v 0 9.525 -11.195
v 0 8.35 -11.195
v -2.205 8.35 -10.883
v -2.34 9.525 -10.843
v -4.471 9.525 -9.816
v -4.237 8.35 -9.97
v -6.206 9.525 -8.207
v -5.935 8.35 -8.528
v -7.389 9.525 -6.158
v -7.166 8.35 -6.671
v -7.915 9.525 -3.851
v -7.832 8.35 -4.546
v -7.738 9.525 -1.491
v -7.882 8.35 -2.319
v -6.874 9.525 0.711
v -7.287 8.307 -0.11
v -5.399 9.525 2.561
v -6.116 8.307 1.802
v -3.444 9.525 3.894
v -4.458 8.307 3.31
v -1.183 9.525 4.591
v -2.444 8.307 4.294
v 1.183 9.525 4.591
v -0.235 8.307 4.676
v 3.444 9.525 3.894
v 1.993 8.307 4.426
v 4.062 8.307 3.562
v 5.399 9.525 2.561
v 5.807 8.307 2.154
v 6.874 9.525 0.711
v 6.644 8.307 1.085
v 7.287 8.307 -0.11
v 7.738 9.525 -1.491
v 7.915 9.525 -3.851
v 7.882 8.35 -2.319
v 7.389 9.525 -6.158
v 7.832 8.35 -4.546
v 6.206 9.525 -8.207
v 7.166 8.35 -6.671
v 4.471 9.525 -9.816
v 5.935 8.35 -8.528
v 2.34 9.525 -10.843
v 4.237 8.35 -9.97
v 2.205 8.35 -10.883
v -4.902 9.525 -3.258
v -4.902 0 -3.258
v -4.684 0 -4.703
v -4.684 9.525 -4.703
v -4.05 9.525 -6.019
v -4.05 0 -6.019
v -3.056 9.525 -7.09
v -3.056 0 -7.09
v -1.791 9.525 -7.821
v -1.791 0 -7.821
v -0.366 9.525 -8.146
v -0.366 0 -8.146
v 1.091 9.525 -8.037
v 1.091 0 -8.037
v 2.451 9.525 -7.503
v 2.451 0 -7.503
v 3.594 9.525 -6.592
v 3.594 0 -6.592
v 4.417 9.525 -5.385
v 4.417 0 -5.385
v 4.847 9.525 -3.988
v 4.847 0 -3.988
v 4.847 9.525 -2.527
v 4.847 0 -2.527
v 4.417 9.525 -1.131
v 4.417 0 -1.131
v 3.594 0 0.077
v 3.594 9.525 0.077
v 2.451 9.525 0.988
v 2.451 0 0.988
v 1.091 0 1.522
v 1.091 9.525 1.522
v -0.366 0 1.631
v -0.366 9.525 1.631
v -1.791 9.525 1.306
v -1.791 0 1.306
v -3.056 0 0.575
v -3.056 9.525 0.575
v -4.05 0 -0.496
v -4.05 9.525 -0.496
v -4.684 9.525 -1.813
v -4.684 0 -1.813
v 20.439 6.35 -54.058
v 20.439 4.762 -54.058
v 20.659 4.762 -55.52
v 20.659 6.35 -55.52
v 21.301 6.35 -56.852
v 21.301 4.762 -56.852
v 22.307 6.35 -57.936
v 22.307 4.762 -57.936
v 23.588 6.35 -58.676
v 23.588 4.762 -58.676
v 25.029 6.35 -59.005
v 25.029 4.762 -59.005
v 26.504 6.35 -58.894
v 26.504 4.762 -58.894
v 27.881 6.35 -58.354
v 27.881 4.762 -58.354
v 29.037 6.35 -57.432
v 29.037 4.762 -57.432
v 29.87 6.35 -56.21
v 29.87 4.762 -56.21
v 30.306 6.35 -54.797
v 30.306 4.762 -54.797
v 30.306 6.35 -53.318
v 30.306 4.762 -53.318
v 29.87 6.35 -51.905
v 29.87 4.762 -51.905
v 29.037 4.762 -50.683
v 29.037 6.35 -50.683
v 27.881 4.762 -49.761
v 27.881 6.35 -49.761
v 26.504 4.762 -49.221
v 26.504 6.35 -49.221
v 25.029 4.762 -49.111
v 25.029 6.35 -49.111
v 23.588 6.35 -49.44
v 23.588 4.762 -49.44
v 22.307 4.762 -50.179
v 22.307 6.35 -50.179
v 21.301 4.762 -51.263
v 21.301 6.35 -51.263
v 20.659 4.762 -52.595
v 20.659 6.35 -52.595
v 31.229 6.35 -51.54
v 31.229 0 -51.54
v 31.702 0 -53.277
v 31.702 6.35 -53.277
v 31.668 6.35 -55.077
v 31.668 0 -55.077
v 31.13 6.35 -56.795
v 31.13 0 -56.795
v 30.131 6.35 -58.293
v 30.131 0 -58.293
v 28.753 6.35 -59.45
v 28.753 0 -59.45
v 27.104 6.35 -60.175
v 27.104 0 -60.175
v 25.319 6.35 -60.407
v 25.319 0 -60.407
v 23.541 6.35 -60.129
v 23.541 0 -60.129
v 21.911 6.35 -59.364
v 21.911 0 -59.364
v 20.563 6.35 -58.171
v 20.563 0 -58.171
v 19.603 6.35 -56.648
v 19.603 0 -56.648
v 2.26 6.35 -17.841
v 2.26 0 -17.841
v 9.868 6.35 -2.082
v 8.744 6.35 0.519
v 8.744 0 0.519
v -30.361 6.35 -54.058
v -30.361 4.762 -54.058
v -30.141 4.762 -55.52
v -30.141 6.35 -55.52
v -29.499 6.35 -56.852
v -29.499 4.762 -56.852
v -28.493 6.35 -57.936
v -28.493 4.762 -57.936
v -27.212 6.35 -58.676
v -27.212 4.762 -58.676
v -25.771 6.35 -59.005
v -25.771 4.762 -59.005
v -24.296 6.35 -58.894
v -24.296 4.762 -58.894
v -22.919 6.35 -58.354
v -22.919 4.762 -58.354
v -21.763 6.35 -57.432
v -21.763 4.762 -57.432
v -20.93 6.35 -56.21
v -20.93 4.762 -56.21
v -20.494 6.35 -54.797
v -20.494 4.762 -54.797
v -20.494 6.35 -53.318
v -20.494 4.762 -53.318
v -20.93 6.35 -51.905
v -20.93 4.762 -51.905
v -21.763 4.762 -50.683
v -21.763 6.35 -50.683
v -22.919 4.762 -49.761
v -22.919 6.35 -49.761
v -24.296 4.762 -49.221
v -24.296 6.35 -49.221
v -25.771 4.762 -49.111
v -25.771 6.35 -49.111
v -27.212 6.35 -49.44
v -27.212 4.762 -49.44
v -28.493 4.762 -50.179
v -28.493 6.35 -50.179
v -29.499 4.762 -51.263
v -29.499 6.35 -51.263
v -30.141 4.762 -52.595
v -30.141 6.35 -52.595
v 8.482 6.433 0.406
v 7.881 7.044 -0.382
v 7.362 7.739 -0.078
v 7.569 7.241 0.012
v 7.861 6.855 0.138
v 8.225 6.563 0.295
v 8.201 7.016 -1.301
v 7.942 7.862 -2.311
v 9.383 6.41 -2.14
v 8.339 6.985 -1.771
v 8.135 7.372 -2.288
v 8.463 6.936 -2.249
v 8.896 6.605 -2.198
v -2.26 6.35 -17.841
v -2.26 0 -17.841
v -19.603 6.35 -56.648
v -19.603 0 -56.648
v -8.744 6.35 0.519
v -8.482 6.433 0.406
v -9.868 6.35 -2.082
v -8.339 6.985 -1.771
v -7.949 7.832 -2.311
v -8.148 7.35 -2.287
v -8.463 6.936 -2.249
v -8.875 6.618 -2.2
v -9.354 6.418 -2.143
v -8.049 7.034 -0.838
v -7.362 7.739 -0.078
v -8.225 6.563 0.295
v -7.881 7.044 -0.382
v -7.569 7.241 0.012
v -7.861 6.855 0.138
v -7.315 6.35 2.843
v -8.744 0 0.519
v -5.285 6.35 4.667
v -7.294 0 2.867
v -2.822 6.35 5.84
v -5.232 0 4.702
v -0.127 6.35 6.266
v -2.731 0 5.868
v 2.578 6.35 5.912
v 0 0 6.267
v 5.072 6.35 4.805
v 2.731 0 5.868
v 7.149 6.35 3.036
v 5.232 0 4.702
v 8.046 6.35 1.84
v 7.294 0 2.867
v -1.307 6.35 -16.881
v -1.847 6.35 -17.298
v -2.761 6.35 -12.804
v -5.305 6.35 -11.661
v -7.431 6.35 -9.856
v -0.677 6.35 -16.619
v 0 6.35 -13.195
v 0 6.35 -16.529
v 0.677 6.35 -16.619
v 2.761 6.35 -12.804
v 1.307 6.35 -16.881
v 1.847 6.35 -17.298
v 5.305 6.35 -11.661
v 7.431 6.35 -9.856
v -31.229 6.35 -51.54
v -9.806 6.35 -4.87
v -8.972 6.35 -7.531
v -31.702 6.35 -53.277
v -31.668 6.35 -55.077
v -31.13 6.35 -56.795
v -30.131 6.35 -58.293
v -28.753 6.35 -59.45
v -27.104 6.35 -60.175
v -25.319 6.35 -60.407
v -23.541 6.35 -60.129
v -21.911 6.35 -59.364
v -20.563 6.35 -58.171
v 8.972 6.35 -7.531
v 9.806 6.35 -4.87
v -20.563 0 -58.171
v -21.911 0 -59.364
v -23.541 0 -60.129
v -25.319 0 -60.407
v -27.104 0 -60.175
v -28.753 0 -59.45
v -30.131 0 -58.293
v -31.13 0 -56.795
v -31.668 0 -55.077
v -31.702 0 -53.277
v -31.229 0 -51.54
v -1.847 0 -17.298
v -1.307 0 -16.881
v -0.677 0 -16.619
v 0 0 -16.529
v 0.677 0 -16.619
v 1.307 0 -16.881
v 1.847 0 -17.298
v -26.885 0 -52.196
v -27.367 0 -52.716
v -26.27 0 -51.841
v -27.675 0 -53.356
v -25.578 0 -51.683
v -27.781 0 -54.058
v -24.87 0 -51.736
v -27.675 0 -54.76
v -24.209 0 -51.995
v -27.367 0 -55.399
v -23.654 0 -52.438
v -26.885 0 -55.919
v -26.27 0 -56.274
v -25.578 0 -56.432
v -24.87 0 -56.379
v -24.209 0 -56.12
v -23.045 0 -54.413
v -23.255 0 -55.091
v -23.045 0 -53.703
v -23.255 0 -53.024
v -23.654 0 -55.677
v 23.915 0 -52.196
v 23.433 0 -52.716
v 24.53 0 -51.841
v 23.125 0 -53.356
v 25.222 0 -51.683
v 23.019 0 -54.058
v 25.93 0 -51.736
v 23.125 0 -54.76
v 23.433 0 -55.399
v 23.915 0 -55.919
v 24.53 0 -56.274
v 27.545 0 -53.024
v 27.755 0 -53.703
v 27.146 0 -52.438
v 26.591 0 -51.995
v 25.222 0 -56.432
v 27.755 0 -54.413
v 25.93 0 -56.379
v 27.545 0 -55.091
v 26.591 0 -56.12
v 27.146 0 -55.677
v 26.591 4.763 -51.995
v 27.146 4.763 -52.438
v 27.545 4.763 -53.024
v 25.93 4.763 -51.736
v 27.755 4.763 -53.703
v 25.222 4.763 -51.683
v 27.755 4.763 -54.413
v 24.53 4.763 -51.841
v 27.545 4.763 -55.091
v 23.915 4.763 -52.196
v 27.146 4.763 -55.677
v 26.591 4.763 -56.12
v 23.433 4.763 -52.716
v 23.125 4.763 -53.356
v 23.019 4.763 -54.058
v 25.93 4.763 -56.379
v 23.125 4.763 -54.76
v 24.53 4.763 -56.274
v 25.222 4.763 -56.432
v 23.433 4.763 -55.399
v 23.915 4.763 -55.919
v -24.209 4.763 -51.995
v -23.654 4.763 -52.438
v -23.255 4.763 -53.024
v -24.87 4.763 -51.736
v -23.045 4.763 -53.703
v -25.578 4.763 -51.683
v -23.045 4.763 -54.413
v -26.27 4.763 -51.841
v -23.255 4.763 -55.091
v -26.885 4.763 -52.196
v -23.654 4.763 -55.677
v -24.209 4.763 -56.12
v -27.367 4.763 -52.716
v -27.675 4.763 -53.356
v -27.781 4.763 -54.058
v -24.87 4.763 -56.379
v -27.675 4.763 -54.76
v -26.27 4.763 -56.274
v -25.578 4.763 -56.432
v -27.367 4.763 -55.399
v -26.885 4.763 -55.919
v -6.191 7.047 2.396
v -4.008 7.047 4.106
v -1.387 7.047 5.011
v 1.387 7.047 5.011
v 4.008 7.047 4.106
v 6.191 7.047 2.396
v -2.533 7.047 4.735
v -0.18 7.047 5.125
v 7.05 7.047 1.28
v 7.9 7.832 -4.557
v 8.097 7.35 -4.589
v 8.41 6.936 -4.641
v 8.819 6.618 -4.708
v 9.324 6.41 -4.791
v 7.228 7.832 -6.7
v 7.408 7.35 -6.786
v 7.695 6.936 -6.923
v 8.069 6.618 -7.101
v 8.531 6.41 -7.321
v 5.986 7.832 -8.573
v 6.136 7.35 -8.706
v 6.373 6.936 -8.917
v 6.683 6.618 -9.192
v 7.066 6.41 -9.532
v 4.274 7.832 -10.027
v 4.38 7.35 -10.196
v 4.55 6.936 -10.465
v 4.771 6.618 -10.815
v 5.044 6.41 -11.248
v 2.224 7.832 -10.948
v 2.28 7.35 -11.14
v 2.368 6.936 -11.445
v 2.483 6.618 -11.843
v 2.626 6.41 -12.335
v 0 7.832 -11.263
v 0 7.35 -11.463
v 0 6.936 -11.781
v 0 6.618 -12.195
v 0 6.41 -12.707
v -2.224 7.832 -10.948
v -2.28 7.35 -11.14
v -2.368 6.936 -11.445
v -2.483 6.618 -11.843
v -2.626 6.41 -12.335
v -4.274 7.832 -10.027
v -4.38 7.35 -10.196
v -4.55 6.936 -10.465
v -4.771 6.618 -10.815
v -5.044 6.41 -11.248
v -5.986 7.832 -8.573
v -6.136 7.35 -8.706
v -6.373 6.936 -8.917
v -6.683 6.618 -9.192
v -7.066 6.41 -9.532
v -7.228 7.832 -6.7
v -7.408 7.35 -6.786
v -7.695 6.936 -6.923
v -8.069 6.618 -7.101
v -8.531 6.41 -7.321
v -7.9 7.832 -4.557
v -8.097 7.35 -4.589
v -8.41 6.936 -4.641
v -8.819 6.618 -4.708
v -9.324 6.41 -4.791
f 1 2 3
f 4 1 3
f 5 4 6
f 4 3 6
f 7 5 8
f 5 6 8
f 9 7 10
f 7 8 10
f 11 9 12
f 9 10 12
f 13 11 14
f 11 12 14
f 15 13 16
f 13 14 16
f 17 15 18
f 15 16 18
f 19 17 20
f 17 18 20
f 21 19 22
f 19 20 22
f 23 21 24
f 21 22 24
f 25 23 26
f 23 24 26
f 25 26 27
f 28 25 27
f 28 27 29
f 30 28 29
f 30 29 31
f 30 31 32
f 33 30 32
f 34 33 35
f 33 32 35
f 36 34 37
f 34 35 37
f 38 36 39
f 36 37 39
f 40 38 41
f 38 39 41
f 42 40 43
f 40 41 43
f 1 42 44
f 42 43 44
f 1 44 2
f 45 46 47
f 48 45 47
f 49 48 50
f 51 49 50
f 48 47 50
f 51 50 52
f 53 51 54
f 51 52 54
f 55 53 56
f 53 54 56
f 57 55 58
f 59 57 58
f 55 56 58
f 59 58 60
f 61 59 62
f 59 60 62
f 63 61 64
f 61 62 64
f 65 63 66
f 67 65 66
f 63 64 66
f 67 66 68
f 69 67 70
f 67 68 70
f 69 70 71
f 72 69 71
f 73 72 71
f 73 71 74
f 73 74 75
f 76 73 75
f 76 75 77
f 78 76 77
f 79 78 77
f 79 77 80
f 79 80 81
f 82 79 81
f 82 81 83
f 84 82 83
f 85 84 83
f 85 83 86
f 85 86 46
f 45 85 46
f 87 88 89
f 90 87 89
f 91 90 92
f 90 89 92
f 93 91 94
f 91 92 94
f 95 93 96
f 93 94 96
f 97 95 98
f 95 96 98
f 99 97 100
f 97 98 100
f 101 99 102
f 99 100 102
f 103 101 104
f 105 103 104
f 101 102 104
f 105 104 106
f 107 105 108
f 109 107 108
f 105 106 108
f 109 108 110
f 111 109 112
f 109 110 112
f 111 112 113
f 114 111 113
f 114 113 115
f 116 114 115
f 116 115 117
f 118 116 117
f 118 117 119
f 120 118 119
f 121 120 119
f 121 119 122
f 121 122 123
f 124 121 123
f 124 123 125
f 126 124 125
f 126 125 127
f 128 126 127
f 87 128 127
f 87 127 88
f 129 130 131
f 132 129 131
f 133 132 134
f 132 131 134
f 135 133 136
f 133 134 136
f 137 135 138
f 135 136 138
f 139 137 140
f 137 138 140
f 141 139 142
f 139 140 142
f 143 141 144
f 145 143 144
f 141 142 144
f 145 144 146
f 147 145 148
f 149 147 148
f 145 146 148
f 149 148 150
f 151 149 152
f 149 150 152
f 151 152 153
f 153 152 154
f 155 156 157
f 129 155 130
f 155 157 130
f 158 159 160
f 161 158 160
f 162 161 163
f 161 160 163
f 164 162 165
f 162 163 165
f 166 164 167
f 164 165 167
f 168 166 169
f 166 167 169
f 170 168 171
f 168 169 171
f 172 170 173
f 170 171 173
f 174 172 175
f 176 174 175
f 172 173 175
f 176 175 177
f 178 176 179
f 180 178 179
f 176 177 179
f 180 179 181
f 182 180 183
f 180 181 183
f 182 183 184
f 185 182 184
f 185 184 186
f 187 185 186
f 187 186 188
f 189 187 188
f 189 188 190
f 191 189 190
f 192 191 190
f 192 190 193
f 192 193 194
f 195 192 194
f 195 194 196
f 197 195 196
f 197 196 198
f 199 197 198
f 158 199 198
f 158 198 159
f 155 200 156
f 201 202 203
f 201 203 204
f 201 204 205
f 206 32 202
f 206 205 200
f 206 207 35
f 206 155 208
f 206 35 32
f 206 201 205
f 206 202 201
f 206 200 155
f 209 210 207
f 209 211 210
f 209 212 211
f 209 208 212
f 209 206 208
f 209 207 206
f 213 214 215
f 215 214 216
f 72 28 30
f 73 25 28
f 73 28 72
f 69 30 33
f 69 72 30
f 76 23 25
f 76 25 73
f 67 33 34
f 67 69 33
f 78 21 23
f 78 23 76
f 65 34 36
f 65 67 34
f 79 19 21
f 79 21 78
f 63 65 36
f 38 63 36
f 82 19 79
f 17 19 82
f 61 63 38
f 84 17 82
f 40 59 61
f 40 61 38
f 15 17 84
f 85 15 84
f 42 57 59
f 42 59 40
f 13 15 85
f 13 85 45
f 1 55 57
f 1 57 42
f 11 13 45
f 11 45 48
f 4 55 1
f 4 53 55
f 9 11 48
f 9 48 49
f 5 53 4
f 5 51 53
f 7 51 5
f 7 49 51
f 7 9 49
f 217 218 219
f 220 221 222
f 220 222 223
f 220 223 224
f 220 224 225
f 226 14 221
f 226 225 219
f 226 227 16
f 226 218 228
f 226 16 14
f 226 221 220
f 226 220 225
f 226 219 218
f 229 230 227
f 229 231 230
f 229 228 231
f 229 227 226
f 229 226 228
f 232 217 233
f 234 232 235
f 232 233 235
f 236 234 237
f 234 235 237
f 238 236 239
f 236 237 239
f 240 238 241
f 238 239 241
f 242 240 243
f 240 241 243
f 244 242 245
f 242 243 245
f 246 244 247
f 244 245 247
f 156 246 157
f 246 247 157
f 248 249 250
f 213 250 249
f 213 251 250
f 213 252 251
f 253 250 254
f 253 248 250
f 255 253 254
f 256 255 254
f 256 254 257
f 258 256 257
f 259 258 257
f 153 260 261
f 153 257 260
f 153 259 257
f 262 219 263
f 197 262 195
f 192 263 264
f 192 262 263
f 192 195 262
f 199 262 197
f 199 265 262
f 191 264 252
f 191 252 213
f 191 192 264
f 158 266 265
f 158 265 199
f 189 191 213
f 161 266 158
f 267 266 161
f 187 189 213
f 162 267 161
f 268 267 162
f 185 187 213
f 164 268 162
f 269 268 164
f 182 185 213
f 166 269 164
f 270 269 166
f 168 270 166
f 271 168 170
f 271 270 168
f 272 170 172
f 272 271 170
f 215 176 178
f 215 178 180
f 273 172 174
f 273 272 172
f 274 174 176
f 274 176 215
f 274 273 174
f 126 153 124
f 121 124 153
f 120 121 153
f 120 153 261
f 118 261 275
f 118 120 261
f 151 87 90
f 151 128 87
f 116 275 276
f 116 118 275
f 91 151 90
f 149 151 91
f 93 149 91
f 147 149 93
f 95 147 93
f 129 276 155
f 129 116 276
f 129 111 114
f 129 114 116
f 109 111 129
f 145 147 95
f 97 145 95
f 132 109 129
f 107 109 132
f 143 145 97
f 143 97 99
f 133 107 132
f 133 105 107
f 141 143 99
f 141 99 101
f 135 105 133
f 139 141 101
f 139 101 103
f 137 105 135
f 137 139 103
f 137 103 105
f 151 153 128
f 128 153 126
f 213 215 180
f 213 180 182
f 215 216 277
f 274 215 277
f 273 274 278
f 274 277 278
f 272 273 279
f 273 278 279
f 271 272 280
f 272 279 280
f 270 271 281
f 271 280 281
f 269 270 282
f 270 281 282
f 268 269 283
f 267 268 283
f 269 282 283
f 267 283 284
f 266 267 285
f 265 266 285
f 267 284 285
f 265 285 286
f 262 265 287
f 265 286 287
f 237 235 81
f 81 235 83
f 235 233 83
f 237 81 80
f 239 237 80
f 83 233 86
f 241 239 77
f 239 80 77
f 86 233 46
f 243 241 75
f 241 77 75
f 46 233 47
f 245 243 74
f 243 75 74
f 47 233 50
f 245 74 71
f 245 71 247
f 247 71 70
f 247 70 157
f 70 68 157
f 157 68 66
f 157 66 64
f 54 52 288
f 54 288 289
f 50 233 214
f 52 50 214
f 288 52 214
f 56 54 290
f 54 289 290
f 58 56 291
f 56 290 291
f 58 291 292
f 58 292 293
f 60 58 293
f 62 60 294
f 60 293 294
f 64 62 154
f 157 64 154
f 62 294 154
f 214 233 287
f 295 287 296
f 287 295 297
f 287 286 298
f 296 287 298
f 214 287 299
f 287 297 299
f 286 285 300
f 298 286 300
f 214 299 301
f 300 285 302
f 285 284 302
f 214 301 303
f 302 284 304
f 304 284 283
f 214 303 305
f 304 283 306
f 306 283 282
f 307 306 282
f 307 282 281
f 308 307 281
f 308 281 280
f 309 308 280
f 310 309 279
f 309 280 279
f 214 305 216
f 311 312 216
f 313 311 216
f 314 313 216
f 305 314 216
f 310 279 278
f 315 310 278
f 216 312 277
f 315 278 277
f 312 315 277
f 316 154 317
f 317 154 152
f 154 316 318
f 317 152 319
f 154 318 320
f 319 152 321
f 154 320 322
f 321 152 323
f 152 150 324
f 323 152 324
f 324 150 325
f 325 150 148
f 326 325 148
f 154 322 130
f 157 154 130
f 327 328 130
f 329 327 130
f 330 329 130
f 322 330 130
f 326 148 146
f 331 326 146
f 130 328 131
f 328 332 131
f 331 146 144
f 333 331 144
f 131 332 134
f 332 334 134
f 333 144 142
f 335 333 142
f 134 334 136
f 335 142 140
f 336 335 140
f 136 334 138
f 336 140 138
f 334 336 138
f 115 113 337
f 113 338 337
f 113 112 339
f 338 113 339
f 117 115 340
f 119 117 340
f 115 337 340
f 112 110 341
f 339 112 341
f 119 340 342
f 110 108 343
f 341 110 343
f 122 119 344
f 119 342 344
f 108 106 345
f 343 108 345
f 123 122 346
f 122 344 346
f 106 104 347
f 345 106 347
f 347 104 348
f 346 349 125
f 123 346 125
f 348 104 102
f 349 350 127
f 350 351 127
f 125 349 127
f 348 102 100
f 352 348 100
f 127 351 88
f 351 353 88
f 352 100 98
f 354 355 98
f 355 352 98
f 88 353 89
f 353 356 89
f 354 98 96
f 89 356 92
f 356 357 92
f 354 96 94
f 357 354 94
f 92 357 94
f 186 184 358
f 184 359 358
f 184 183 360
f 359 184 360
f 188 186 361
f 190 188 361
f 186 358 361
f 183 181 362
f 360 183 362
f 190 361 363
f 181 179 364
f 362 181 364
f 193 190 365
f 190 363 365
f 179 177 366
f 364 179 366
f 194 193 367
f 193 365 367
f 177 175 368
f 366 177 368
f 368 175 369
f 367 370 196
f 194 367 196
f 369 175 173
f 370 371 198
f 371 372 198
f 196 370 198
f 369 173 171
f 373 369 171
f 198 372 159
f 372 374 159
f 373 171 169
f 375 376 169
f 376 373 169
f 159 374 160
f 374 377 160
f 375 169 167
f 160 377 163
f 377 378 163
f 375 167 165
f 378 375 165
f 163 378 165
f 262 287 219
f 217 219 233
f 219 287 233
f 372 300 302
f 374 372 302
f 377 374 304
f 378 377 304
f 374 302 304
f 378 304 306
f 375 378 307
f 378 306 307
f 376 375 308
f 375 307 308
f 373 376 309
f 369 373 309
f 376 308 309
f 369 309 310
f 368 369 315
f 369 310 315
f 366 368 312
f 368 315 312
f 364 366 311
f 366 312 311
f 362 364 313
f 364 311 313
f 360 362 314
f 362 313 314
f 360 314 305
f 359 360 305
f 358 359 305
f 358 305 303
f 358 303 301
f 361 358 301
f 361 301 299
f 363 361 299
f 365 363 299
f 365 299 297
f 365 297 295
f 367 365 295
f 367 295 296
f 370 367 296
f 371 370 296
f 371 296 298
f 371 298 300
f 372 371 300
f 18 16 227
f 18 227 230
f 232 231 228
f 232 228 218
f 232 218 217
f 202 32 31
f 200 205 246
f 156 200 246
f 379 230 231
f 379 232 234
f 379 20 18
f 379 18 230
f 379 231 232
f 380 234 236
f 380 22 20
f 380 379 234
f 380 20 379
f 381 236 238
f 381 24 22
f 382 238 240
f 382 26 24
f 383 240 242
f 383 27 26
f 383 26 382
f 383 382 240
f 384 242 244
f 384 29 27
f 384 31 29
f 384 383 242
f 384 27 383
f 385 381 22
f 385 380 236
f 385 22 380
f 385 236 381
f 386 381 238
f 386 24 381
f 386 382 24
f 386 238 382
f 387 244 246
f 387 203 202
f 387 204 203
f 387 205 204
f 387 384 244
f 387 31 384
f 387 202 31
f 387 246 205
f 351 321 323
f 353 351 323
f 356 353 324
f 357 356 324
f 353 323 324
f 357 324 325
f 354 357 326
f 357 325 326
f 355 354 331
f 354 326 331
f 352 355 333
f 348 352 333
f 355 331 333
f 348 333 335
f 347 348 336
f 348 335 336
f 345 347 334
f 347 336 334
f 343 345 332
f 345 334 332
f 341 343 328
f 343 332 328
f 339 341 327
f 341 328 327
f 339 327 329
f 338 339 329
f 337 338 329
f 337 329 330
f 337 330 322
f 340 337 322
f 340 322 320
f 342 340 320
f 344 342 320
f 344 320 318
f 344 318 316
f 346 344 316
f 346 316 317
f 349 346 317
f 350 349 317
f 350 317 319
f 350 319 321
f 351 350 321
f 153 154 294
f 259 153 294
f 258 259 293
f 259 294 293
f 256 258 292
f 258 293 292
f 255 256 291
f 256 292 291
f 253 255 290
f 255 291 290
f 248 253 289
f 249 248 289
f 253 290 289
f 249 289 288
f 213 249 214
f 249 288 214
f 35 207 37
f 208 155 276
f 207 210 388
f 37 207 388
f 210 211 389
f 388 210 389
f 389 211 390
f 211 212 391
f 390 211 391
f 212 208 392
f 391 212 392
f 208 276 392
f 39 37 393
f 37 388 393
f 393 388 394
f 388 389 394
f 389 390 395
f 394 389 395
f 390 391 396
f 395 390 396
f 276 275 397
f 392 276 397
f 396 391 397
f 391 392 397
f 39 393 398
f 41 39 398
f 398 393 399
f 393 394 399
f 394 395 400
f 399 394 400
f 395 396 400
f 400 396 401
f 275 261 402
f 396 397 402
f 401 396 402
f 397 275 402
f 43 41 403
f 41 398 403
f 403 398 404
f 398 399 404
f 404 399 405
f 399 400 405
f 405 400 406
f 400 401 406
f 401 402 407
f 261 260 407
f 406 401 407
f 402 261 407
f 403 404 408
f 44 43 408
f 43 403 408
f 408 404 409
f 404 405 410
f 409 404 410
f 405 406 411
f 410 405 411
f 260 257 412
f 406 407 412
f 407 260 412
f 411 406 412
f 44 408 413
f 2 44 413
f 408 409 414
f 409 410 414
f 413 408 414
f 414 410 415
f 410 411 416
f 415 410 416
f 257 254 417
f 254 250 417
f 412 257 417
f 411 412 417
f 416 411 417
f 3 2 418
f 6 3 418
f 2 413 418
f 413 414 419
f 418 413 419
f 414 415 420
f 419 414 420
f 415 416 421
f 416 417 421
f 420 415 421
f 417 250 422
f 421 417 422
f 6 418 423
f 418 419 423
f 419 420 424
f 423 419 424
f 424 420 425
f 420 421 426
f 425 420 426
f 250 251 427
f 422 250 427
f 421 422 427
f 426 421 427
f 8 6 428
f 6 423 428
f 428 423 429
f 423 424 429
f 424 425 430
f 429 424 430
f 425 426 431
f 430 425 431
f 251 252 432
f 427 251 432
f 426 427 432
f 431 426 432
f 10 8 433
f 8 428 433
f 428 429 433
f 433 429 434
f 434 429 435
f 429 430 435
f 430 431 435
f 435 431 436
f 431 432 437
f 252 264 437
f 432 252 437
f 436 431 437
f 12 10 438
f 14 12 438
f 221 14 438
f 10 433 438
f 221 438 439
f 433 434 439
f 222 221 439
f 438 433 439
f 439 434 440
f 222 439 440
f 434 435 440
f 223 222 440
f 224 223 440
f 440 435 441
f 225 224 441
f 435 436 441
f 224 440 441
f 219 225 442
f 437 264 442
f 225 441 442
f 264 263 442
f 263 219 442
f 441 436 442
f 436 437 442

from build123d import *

# Parameters (mm, degrees)
SKETCH1_R                            = 7.9375
BOSS_EXTRUDE1_DEPTH                  = 6.35
F_3_16_0_1875_DIAMETER_HOLE1_D       = 4.7625
SKETCH1_3_R                          = 7.9375
BOSS_EXTRUDE2_DEPTH                  = 9.525
W_0_386_DIAMETER_HOLE1_D             = 9.8044
FILLET1_R                            = 2
F_25_64_0_39063_DIAMETER_HOLE1_D     = 9.922002
F_25_64_0_39063_DIAMETER_HOLE1_DEPTH = 1.5875


with BuildPart() as part:
    # Sketch1 → Boss-Extrude1 (new body)
    with BuildSketch(Plane(origin=(0, 0, 0), x_dir=(1, 0, 0), z_dir=(0, 1, 0))):
        with BuildLine():
            ThreePointArc((2.26024053, 17.840513709), (0, 16.529128421), (-2.26024053, 17.840513709))
            Line((-2.26024053, 17.840513709), (-19.602540008, 56.648386542))
            ThreePointArc((-19.602540008, 56.648386542), (-27.954355314, 59.871226792), (-31.229481324, 51.539776269))
            Line((-31.229481324, 51.539776269), (-8.744221986, -0.519156562))
            ThreePointArc((-8.744221986, -0.519156562), (0, -6.267358068), (8.744221986, -0.519156562))
            Line((8.744221986, -0.519156562), (31.229481324, 51.539776269))
            ThreePointArc((31.229481324, 51.539776269), (27.954355314, 59.871226792), (19.602540008, 56.648386542))
            Line((19.602540008, 56.648386542), (2.26024053, 17.840513709))
        make_face()
        with Locations(Location((0, 3.257641932, 0), (0, 0, 270))):
            Circle(SKETCH1_R, mode=Mode.SUBTRACT)
    extrude(amount=BOSS_EXTRUDE1_DEPTH)

    # 3/16 (0.1875) Diameter Hole1 (through all)
    with Locations(Plane(origin=(0, 6.35, 0), x_dir=(1, 0, 0), z_dir=(0, 1, 0))):
        with Locations((-25.4, 54.057641932), (25.4, 54.057641932)):
            Hole(F_3_16_0_1875_DIAMETER_HOLE1_D / 2)

    # Sketch1<3> → Boss-Extrude2 (add)
    with BuildSketch(Plane(origin=(0, 0, 0), x_dir=(1, 0, 0), z_dir=(0, 1, 0))):
        with Locations(Location((0, 3.257641932, 0), (0, 0, 90))):
            Circle(SKETCH1_3_R)
    extrude(amount=BOSS_EXTRUDE2_DEPTH)

    # W (0.386) Diameter Hole1 (through all)
    with Locations(Plane(origin=(0, 9.525, 0), x_dir=(1, 0, 0), z_dir=(0, 1, 0))):
        with Locations((0, 3.257641932)):
            Hole(W_0_386_DIAMETER_HOLE1_D / 2)

    # Fillet1
    fillet1_edges = [part.edges().sort_by_distance(p)[0] for p in [
        (0, 6.35, 4.679858068),
    ]]
    fillet(fillet1_edges, radius=FILLET1_R)

    # 25/64 (0.39063) Diameter Hole1
    with Locations(Plane(origin=(0, 6.35, 0), x_dir=(1, 0, 0), z_dir=(0, 1, 0))):
        with Locations((-25.4, 54.057641932), (25.4, 54.057641932)):
            Hole(F_25_64_0_39063_DIAMETER_HOLE1_D / 2, depth=F_25_64_0_39063_DIAMETER_HOLE1_DEPTH)


solid = part.part
